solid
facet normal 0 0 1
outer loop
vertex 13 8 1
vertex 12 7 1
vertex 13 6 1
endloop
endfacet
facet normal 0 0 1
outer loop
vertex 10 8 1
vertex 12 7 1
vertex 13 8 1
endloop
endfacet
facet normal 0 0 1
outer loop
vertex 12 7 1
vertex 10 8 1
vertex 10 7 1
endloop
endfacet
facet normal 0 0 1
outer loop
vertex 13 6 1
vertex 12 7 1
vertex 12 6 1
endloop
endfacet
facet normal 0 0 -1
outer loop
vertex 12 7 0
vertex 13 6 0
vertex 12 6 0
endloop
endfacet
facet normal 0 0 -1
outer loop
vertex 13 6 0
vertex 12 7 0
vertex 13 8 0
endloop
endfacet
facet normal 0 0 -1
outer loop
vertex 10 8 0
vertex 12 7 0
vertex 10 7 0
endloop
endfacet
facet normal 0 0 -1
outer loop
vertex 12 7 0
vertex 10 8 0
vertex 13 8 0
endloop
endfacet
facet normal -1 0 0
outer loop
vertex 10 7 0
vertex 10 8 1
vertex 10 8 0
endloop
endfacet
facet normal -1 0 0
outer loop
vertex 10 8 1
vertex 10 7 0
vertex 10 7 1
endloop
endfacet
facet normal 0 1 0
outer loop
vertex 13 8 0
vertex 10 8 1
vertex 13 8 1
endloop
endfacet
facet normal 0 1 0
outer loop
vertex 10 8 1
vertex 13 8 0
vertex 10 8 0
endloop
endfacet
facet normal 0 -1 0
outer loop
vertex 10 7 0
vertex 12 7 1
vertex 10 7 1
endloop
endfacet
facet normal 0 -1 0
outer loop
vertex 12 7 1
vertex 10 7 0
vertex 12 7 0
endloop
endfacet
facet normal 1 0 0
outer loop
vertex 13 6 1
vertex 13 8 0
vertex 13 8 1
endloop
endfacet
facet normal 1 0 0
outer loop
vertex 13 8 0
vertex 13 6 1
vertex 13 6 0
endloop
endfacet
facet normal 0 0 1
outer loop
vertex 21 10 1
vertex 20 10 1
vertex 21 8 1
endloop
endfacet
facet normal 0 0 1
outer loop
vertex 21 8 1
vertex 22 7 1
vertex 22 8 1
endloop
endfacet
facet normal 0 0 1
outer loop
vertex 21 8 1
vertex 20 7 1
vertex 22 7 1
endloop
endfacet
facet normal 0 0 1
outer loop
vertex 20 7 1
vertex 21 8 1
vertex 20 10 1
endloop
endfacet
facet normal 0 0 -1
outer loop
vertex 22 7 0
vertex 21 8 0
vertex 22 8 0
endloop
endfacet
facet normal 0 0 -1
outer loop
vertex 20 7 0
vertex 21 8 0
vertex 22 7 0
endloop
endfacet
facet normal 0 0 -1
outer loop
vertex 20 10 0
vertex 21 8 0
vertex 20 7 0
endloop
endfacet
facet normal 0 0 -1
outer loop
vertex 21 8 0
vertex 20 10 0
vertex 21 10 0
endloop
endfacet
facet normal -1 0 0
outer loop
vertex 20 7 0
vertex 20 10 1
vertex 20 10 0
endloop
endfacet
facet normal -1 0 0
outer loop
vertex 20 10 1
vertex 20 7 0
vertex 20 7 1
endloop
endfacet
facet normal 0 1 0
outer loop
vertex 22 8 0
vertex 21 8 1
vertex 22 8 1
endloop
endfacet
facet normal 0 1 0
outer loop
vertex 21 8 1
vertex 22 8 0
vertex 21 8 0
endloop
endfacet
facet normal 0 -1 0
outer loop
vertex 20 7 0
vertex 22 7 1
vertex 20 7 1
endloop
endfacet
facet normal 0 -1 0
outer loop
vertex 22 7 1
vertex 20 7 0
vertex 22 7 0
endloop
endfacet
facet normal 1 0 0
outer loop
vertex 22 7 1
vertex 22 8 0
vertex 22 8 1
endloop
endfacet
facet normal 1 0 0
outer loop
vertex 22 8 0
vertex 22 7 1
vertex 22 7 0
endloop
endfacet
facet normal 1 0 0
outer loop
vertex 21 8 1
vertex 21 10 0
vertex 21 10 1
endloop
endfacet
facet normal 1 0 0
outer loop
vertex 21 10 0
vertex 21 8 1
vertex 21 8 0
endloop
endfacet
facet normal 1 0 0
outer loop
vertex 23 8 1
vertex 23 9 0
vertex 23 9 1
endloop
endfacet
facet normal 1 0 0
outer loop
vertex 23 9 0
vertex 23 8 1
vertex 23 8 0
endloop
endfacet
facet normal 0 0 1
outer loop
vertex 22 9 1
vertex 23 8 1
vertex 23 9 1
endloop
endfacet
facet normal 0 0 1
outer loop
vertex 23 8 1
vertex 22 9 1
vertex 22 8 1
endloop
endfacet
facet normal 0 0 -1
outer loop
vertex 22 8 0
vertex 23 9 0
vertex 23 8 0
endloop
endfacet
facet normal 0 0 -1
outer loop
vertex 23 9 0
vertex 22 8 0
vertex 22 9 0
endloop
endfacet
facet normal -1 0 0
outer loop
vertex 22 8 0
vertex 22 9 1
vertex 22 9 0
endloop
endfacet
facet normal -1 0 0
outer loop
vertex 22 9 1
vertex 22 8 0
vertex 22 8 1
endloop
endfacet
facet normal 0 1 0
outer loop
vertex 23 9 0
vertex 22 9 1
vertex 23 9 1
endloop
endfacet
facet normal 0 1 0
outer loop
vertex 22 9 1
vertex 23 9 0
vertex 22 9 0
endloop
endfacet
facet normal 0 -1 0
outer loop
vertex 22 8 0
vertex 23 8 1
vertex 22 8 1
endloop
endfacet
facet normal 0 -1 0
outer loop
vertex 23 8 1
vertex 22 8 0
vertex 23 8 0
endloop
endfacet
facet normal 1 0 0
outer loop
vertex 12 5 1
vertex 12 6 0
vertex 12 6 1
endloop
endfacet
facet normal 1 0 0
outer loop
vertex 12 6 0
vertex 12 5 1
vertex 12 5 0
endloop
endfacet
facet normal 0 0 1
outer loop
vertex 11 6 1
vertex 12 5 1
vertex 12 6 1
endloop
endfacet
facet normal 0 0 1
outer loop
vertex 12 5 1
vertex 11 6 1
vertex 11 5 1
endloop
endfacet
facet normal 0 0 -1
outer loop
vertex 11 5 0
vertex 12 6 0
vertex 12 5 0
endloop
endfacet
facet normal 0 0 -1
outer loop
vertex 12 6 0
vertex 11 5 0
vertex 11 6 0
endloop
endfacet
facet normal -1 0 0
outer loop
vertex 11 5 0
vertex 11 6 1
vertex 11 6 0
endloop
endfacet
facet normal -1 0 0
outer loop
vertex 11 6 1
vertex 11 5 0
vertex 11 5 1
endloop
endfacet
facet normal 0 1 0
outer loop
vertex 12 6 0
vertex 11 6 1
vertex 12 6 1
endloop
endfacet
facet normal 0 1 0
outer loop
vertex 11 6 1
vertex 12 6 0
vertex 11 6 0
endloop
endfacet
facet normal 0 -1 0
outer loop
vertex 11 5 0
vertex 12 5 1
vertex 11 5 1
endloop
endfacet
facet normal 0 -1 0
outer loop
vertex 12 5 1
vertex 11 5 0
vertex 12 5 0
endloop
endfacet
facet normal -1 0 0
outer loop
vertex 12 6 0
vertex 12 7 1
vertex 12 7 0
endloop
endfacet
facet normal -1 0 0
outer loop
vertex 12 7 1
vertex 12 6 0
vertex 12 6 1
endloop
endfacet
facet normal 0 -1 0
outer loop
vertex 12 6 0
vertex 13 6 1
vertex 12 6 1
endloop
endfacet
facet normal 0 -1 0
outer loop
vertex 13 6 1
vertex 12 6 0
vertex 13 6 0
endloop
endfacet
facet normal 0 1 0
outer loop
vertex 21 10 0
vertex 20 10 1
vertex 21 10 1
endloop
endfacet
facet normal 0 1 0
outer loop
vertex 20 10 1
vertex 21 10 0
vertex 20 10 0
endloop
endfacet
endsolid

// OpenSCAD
/**
 * Conway's Game of Life in OpenSCAD
 *
 * To generate images of different generations:
 *   openscad -o gen0.png -Dgen=0 cgol.scad
 *   openscad -o gen1.png -Dgen=1 cgol.scad
 *   ...
 *   openscad -o gen25.png -Dgen=25 cgol.scad
 *
 * This version dynamically computes any requested generation.
 */

gen = 0; // generation can be overridden by -Dgen=N

// Grid dimensions
width = 190;
height = 190;

// Initial grid (Generation 0)
gen0 = [
[0,0,0,0,0,0,0,0,0,0,0,0,0,0,0,0,0,0,0,0,0,0,0,0,0,0,0,0,0,0,0,0,0,0,0,0],
[0,0,0,0,0,0,0,0,0,0,0,0,0,0,0,0,0,0,0,0,0,0,0,0,0,0,0,0,0,0,0,0,0,0,0,0],
[0,0,0,0,0,0,0,0,0,0,0,0,0,0,0,0,0,0,0,0,0,0,0,0,0,0,0,0,0,0,0,0,0,0,0,0],
[0,0,0,0,0,0,0,0,0,0,0,0,0,0,0,0,0,0,0,0,0,0,0,0,0,0,0,0,0,0,0,0,0,0,0,0],
[0,0,0,0,0,0,0,0,0,0,0,0,0,0,0,0,0,0,0,0,0,0,0,0,0,0,0,0,0,0,0,0,0,0,0,0],
[0,0,0,0,0,0,0,0,0,0,0,1,0,0,0,0,0,0,0,0,0,0,0,0,0,0,0,0,0,0,0,0,0,0,0,0],
[0,0,0,0,0,0,0,0,0,0,0,0,1,0,0,0,0,0,0,0,0,0,0,0,0,0,0,0,0,0,0,0,0,0,0,0],
[0,0,0,0,0,0,0,0,0,0,1,1,1,0,0,0,0,0,0,0,1,1,0,0,0,0,0,0,0,0,0,0,0,0,0,0],
[0,0,0,0,0,0,0,0,0,0,0,0,0,0,0,0,0,0,0,0,1,0,1,0,0,0,0,0,0,0,0,0,0,0,0,0],
[0,0,0,0,0,0,0,0,0,0,0,0,0,0,0,0,0,0,0,0,1,0,0,0,0,0,0,0,0,0,0,0,0,0,0,0],
[0,0,0,0,0,0,0,0,0,0,0,0,0,0,0,0,0,0,0,0,0,0,0,0,0,0,0,0,0,0,0,0,0,0,0,0]
];


// Function to count alive neighbors
function count_neighbors(grid, x, y) =
    grid[(y-1 + height) % height][(x-1 + width) % width] +
    grid[(y-1 + height) % height][x] +
    grid[(y-1 + height) % height][(x+1) % width] +
    grid[y][(x-1 + width) % width] +
    grid[y][(x+1) % width] +
    grid[(y+1) % height][(x-1 + width) % width] +
    grid[(y+1) % height][x] +
    grid[(y+1) % height][(x+1) % width];

// Function to compute the next generation from a given grid
function next_grid(grid) =
    [
        for (y = [0:height-1]) [
            for (x = [0:width-1]) (
                (grid[y][x] == 1 && (count_neighbors(grid, x, y) == 2 || count_neighbors(grid, x, y) == 3)) ||
                (grid[y][x] == 0 && count_neighbors(grid, x, y) == 3) ? 1 : 0
            )
        ]
    ];

// Recursive function to compute the nth generation from the initial grid
function compute_generation(grid, n) =
    n == 0 ? grid : compute_generation(next_grid(grid), n-1);

// Compute the current generation grid dynamically
current_grid = compute_generation(gen0, gen);

// Module to render the grid
module render_grid(g) {
    // Draw a cube for each alive cell
    for (y = [0:height-1]) {
        for (x = [0:width-1]) {
            if (g[y][x] == 1)
                translate([x, y, 0]) cube([1,1,1], center=false);
        }
    }
}

// Render the current grid
render_grid(current_grid);
